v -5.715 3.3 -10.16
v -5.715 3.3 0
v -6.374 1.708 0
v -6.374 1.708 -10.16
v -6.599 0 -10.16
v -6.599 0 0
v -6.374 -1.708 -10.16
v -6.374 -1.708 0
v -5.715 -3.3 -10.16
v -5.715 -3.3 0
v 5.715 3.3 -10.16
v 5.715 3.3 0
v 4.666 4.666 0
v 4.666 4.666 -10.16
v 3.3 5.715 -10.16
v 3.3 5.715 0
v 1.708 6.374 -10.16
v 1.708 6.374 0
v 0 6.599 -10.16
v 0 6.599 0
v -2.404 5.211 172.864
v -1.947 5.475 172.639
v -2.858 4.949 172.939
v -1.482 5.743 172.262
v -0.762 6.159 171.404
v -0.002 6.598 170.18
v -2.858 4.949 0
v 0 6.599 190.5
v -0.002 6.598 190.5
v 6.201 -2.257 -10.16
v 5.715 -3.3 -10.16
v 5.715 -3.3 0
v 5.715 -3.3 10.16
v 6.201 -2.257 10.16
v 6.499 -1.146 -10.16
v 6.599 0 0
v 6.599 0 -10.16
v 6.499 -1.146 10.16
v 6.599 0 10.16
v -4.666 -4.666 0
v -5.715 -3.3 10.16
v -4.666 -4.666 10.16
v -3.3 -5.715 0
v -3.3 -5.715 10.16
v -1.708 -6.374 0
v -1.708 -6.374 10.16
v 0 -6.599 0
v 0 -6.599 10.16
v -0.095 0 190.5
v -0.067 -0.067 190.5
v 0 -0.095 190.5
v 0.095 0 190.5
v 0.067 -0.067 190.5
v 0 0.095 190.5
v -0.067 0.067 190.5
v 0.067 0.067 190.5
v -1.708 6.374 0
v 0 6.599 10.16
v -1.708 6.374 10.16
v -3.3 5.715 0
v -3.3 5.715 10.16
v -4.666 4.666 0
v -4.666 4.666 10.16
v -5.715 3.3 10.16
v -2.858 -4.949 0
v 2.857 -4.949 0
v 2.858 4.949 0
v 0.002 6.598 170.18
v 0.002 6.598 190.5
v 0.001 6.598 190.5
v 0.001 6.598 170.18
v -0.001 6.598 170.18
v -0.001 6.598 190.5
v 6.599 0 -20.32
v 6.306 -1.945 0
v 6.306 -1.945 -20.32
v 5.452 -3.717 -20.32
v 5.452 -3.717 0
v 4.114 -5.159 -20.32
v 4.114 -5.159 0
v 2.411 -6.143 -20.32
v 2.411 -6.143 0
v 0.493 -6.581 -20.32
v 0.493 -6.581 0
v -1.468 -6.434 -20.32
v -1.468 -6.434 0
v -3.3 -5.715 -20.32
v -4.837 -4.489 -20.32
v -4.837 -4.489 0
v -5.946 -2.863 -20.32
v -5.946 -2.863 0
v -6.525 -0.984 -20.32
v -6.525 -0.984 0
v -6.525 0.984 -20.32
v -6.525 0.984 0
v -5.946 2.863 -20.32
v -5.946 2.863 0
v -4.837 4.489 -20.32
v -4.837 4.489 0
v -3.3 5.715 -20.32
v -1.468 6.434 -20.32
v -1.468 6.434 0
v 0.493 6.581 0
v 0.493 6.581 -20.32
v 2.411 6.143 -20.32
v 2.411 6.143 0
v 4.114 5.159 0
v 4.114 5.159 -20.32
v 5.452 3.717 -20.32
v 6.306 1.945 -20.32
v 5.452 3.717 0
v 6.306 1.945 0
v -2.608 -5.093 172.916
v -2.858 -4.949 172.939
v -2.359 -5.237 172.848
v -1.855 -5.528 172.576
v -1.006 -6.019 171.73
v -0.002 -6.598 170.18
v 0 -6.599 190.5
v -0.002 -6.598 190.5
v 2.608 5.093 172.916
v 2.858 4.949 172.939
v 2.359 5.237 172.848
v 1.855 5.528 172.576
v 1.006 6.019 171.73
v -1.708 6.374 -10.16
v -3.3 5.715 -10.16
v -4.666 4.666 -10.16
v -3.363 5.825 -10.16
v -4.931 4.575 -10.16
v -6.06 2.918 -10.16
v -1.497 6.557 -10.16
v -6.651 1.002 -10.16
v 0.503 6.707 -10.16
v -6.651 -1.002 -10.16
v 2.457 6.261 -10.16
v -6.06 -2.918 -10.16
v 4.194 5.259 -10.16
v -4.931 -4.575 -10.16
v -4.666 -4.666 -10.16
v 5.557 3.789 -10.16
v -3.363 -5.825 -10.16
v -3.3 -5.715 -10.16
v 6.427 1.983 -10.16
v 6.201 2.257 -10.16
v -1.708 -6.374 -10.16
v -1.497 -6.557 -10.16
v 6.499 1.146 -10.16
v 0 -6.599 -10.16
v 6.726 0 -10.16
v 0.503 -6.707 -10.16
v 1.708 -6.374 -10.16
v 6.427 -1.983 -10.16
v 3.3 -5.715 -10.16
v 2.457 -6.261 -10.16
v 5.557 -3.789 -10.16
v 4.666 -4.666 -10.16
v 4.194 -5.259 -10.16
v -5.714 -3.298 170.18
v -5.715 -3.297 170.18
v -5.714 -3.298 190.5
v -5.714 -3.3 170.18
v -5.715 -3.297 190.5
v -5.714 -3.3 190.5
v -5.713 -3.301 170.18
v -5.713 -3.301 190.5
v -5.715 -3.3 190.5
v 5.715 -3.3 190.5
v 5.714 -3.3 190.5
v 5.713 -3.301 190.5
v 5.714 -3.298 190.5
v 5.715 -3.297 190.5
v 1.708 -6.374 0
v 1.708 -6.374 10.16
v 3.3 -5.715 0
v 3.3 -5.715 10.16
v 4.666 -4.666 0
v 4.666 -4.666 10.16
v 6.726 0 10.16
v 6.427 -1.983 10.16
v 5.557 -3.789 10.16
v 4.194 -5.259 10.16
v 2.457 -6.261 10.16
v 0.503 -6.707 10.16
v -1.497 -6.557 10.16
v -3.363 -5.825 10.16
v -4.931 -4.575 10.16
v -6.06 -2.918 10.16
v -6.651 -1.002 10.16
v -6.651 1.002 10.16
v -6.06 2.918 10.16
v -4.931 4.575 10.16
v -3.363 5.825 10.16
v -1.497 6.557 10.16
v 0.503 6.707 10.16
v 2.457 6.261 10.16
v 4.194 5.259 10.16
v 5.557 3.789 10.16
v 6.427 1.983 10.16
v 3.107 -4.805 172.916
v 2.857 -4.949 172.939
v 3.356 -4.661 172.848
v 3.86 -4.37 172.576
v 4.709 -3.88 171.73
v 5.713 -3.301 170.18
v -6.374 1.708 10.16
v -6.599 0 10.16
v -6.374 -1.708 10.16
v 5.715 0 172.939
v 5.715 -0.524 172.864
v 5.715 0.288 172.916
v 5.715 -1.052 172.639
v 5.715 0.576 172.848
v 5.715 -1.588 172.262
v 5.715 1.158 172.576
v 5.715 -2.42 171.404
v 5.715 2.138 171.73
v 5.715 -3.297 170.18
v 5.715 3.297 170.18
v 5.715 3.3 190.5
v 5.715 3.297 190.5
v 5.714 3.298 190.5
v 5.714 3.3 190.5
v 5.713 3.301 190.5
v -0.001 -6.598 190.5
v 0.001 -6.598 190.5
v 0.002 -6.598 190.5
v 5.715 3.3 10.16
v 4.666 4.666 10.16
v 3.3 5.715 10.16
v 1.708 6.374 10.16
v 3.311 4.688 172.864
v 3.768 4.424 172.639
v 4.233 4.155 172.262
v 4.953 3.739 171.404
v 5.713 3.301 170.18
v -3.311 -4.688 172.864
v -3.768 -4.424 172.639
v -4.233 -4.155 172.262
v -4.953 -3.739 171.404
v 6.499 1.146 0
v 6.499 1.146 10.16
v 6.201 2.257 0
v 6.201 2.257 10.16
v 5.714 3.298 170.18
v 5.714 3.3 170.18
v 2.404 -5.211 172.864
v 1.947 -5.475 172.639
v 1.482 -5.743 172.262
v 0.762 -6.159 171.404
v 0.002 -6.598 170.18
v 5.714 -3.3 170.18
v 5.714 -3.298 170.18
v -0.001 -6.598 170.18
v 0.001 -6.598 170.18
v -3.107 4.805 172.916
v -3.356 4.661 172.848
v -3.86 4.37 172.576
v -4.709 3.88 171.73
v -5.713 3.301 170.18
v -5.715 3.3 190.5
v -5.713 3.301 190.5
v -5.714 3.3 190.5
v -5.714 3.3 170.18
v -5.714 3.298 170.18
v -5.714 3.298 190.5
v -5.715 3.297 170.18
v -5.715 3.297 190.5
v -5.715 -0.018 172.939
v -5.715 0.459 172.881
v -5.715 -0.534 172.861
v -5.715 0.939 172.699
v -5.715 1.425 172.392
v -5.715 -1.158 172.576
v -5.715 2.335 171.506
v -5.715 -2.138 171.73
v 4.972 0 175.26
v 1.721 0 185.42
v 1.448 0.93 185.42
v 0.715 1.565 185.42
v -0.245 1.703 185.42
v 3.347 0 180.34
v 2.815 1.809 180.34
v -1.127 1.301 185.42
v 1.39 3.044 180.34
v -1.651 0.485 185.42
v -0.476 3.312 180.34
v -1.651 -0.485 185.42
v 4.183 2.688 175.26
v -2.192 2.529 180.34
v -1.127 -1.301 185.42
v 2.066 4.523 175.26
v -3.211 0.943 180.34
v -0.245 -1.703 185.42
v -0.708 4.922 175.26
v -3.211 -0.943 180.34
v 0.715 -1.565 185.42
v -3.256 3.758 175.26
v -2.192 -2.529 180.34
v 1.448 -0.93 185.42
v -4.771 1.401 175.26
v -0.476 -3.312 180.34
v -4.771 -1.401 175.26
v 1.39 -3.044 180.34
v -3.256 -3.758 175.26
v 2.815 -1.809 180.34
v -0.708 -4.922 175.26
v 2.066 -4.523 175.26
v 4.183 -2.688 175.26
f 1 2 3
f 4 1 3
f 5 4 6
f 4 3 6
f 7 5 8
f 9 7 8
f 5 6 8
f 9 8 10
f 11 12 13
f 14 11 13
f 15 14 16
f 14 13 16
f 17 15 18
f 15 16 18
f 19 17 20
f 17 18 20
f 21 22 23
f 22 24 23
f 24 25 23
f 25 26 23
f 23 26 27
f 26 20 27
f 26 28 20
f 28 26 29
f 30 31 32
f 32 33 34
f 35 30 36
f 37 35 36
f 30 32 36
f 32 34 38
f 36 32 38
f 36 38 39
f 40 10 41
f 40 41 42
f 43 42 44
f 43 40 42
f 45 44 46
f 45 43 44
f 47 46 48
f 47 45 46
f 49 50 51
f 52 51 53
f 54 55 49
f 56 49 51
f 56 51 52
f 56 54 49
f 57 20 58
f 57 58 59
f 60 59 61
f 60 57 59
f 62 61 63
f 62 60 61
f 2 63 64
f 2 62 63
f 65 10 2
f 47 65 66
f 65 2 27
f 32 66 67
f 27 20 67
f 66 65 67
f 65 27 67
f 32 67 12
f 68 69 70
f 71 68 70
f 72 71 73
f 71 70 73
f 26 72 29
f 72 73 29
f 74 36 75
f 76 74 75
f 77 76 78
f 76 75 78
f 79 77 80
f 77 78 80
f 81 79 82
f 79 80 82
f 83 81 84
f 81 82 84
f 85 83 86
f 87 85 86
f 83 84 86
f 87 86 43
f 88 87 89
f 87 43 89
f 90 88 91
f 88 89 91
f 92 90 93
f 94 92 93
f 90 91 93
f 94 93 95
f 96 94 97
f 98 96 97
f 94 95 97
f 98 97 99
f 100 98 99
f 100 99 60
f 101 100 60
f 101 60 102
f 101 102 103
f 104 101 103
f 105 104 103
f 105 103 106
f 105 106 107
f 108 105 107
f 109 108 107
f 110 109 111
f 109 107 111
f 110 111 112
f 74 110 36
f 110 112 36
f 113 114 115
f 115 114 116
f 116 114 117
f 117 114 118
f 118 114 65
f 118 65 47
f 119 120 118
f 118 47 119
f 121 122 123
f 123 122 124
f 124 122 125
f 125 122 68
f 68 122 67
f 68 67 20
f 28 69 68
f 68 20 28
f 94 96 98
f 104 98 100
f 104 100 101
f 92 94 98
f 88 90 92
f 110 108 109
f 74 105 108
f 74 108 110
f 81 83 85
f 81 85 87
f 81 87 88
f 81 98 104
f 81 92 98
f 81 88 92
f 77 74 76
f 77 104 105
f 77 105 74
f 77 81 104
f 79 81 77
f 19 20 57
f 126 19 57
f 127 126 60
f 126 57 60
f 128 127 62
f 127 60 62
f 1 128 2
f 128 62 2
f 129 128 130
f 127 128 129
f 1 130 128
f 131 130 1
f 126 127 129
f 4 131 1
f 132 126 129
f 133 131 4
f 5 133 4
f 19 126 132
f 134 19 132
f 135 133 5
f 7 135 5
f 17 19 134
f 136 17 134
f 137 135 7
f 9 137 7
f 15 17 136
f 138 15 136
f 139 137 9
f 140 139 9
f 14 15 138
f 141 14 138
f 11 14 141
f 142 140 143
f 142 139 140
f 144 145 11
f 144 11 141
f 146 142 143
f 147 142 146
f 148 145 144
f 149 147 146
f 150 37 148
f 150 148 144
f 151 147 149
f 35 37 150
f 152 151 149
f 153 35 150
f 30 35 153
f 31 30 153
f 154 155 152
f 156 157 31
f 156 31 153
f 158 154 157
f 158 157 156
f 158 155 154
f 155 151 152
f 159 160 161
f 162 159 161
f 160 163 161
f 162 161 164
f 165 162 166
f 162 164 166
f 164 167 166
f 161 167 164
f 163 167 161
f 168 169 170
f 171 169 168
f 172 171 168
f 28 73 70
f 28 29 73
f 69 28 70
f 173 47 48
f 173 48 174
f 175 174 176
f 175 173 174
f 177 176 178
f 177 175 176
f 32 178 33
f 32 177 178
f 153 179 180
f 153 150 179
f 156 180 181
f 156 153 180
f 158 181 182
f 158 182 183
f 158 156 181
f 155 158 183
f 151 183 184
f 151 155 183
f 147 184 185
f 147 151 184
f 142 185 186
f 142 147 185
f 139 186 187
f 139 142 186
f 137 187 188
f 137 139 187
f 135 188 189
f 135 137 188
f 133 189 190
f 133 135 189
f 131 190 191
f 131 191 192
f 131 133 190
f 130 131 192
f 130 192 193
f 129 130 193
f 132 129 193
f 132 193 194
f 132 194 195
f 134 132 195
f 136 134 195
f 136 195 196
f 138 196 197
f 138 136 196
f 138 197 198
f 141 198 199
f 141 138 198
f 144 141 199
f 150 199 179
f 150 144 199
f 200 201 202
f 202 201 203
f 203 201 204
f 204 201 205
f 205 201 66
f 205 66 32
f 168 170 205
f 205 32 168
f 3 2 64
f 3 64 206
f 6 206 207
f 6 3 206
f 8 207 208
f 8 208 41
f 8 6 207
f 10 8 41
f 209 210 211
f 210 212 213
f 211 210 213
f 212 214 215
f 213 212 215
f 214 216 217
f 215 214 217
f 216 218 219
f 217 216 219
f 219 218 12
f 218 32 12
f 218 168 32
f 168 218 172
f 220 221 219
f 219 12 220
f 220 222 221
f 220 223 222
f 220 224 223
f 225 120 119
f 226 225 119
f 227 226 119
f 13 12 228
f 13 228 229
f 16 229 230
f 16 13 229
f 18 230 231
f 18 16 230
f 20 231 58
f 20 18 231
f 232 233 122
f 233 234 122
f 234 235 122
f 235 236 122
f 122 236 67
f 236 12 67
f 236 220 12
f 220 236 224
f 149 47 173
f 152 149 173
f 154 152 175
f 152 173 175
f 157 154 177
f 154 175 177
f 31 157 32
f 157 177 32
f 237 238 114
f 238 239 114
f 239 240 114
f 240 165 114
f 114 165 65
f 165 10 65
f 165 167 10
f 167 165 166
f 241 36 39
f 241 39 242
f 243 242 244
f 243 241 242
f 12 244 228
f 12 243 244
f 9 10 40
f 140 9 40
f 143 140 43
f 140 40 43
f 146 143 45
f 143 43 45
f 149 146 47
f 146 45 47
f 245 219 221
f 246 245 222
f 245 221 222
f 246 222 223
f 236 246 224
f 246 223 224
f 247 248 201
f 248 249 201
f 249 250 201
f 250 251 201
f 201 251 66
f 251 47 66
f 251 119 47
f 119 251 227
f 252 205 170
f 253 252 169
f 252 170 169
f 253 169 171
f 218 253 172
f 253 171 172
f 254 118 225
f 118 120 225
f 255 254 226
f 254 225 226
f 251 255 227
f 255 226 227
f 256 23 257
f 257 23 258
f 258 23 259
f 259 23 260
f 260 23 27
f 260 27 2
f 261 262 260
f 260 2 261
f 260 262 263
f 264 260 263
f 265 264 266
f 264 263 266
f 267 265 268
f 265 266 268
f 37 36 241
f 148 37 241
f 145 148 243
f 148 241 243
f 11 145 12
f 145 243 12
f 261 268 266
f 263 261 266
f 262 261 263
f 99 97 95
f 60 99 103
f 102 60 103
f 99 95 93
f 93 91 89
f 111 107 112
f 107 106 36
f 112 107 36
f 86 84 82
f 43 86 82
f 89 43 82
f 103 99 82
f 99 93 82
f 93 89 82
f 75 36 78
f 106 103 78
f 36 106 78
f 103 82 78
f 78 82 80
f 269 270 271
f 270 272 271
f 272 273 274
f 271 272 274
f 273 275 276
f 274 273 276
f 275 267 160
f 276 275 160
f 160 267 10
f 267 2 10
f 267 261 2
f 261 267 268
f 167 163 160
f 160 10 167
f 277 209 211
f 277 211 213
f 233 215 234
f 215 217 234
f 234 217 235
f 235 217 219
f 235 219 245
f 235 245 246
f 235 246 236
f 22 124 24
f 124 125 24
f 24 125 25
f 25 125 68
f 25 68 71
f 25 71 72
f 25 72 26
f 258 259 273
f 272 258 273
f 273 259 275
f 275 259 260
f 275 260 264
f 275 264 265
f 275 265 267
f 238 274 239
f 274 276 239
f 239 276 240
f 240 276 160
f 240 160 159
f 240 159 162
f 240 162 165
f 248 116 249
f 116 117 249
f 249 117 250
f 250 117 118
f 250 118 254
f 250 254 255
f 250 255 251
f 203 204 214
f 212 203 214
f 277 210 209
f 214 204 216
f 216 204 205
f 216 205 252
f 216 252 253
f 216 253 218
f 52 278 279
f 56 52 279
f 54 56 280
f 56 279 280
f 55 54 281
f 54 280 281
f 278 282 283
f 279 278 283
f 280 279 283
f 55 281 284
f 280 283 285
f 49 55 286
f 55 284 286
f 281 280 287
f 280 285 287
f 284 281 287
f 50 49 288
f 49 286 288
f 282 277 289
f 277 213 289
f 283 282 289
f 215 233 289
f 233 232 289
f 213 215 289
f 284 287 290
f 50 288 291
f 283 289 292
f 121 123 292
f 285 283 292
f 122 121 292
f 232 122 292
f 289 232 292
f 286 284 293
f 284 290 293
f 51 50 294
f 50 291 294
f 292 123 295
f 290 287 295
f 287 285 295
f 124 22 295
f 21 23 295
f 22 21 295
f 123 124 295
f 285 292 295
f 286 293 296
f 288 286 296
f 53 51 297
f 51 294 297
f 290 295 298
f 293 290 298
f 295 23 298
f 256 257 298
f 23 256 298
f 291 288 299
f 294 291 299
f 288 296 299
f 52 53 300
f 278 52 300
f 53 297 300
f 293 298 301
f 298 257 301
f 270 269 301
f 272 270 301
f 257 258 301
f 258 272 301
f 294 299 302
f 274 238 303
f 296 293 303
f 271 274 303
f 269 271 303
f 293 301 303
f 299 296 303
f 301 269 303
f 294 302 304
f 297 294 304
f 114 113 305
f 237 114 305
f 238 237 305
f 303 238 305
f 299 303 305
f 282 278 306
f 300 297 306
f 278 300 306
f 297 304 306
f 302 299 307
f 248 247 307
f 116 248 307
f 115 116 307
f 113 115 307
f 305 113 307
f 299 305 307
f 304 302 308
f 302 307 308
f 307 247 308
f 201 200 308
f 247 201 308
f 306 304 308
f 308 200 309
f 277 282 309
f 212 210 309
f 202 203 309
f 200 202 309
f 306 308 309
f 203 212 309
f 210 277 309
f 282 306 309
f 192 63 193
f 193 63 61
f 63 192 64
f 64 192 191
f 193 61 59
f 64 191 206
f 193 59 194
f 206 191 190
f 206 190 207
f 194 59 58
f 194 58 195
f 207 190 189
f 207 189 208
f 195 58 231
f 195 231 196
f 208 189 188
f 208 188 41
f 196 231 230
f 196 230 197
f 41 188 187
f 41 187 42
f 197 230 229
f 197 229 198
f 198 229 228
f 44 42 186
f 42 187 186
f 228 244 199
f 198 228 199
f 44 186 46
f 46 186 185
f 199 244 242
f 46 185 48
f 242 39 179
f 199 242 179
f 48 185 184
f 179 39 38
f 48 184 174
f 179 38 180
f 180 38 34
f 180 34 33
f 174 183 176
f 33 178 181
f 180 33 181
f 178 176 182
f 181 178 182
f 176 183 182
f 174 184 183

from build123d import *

# Parameters (mm, degrees)
F1_DEPTH = 190.5
F2_R     = 6.7261135768
F3_DEPTH = 10.16
F4_R     = 6.5991135768
F5_DEPTH = 20.32


with BuildPart() as f1:
    # F0 (on Top) → F1 (new body)
    with BuildSketch(Plane.XY):
        with BuildLine():
            ThreePointArc((-5.715, 0), (-4.9493351932, 2.8574999817), (-2.8575000366, 4.9493351615))
            Line((-2.8575000366, 4.9493351615), (-5.715, 3.2995567884))
            Line((-5.715, 3.2995567884), (-5.715, 0))
        make_face()
        with BuildLine():
            ThreePointArc((-2.8575000366, 4.9493351615), (-1.92e-08, 5.715), (2.8575000033, 4.9493351807))
            Line((2.8575000033, 4.9493351807), (0, 6.5991135768))
            Line((0, 6.5991135768), (-2.8575000366, 4.9493351615))
        make_face()
        with BuildLine():
            ThreePointArc((2.8574998767, -4.9493352538), (4.949335147, -2.8575000617), (5.715, 0))
            ThreePointArc((5.715, 0), (4.9493351836, 2.8574999984), (2.8575000033, 4.9493351807))
            ThreePointArc((2.8575000033, 4.9493351807), (-1.92e-08, 5.715), (-2.8575000366, 4.9493351615))
            ThreePointArc((-2.8575000366, 4.9493351615), (-4.9493351932, 2.8574999817), (-5.715, 0))
            ThreePointArc((-5.715, 0), (-4.9493352014, -2.8574999675), (-2.857500065, -4.9493351451))
            ThreePointArc((-2.857500065, -4.9493351451), (-1.087e-07, -5.715), (2.8574998767, -4.9493352538))
        make_face()
        with BuildLine():
            ThreePointArc((2.8575000033, 4.9493351807), (4.9493351836, 2.8574999984), (5.715, 0))
            Line((5.715, 0), (5.715, 3.2995567884))
            Line((5.715, 3.2995567884), (2.8575000033, 4.9493351807))
        make_face()
        with BuildLine():
            Line((5.715, -3.2995567884), (5.715, 0))
            ThreePointArc((5.715, 0), (4.949335147, -2.8575000617), (2.8574998767, -4.9493352538))
            Line((2.8574998767, -4.9493352538), (5.715, -3.2995567884))
        make_face()
        with BuildLine():
            Line((0, -6.5991135768), (2.8574998767, -4.9493352538))
            ThreePointArc((2.8574998767, -4.9493352538), (-1.087e-07, -5.715), (-2.857500065, -4.9493351451))
            Line((-2.857500065, -4.9493351451), (0, -6.5991135768))
        make_face()
        with BuildLine():
            Line((-5.715, -3.2995567884), (-2.857500065, -4.9493351451))
            ThreePointArc((-2.857500065, -4.9493351451), (-4.9493352014, -2.8574999675), (-5.715, 0))
            Line((-5.715, 0), (-5.715, -3.2995567884))
        make_face()
    extrude(amount=F1_DEPTH)

    # F7 (on Front) → F9 (revolve, cut)
    with BuildSketch(Plane.XZ):
        Polygon((6.5978481434, 190.5), (0.0952213444, 190.5), (6.5978481434, 170.18), align=None)
    revolve(axis=Axis((0, 0, 95.25), (0, 0, 1)), mode=Mode.SUBTRACT)


with BuildPart() as f3:
    # F2 (on face) → F3 (new body, symmetric)
    with BuildSketch(Plane(origin=(0, 0, 0), x_dir=(1, 0, 0), z_dir=(0, 0, -1))):
        Circle(F2_R)
        with BuildLine():
            ThreePointArc((5.715, 3.2995567884), (6.3742542345, 1.7079762745), (6.5991135768, 0))
            ThreePointArc((6.5991135768, 0), (6.3742542345, -1.7079762745), (5.715, -3.2995567884))
            ThreePointArc((5.715, -3.2995567884), (3.2995567884, -5.715), (0, -6.5991135768))
            ThreePointArc((0, -6.5991135768), (-3.2995567884, -5.715), (-5.715, -3.2995567884))
            ThreePointArc((-5.715, -3.2995567884), (-6.5991135768, 0), (-5.715, 3.2995567884))
            ThreePointArc((-5.715, 3.2995567884), (-3.2995567884, 5.715), (0, 6.5991135768))
            ThreePointArc((0, 6.5991135768), (3.2995567884, 5.715), (5.715, 3.2995567884))
        make_face(mode=Mode.SUBTRACT)
    extrude(amount=F3_DEPTH, both=True)


with BuildPart() as f5:
    # F4 (on face) → F5 (new body)
    with BuildSketch(Plane(origin=(0, 0, 0), x_dir=(1, 0, 0), z_dir=(0, 0, -1))):
        Circle(F4_R)
    extrude(amount=F5_DEPTH)


solid = Compound([f1.part, f3.part, f5.part])
